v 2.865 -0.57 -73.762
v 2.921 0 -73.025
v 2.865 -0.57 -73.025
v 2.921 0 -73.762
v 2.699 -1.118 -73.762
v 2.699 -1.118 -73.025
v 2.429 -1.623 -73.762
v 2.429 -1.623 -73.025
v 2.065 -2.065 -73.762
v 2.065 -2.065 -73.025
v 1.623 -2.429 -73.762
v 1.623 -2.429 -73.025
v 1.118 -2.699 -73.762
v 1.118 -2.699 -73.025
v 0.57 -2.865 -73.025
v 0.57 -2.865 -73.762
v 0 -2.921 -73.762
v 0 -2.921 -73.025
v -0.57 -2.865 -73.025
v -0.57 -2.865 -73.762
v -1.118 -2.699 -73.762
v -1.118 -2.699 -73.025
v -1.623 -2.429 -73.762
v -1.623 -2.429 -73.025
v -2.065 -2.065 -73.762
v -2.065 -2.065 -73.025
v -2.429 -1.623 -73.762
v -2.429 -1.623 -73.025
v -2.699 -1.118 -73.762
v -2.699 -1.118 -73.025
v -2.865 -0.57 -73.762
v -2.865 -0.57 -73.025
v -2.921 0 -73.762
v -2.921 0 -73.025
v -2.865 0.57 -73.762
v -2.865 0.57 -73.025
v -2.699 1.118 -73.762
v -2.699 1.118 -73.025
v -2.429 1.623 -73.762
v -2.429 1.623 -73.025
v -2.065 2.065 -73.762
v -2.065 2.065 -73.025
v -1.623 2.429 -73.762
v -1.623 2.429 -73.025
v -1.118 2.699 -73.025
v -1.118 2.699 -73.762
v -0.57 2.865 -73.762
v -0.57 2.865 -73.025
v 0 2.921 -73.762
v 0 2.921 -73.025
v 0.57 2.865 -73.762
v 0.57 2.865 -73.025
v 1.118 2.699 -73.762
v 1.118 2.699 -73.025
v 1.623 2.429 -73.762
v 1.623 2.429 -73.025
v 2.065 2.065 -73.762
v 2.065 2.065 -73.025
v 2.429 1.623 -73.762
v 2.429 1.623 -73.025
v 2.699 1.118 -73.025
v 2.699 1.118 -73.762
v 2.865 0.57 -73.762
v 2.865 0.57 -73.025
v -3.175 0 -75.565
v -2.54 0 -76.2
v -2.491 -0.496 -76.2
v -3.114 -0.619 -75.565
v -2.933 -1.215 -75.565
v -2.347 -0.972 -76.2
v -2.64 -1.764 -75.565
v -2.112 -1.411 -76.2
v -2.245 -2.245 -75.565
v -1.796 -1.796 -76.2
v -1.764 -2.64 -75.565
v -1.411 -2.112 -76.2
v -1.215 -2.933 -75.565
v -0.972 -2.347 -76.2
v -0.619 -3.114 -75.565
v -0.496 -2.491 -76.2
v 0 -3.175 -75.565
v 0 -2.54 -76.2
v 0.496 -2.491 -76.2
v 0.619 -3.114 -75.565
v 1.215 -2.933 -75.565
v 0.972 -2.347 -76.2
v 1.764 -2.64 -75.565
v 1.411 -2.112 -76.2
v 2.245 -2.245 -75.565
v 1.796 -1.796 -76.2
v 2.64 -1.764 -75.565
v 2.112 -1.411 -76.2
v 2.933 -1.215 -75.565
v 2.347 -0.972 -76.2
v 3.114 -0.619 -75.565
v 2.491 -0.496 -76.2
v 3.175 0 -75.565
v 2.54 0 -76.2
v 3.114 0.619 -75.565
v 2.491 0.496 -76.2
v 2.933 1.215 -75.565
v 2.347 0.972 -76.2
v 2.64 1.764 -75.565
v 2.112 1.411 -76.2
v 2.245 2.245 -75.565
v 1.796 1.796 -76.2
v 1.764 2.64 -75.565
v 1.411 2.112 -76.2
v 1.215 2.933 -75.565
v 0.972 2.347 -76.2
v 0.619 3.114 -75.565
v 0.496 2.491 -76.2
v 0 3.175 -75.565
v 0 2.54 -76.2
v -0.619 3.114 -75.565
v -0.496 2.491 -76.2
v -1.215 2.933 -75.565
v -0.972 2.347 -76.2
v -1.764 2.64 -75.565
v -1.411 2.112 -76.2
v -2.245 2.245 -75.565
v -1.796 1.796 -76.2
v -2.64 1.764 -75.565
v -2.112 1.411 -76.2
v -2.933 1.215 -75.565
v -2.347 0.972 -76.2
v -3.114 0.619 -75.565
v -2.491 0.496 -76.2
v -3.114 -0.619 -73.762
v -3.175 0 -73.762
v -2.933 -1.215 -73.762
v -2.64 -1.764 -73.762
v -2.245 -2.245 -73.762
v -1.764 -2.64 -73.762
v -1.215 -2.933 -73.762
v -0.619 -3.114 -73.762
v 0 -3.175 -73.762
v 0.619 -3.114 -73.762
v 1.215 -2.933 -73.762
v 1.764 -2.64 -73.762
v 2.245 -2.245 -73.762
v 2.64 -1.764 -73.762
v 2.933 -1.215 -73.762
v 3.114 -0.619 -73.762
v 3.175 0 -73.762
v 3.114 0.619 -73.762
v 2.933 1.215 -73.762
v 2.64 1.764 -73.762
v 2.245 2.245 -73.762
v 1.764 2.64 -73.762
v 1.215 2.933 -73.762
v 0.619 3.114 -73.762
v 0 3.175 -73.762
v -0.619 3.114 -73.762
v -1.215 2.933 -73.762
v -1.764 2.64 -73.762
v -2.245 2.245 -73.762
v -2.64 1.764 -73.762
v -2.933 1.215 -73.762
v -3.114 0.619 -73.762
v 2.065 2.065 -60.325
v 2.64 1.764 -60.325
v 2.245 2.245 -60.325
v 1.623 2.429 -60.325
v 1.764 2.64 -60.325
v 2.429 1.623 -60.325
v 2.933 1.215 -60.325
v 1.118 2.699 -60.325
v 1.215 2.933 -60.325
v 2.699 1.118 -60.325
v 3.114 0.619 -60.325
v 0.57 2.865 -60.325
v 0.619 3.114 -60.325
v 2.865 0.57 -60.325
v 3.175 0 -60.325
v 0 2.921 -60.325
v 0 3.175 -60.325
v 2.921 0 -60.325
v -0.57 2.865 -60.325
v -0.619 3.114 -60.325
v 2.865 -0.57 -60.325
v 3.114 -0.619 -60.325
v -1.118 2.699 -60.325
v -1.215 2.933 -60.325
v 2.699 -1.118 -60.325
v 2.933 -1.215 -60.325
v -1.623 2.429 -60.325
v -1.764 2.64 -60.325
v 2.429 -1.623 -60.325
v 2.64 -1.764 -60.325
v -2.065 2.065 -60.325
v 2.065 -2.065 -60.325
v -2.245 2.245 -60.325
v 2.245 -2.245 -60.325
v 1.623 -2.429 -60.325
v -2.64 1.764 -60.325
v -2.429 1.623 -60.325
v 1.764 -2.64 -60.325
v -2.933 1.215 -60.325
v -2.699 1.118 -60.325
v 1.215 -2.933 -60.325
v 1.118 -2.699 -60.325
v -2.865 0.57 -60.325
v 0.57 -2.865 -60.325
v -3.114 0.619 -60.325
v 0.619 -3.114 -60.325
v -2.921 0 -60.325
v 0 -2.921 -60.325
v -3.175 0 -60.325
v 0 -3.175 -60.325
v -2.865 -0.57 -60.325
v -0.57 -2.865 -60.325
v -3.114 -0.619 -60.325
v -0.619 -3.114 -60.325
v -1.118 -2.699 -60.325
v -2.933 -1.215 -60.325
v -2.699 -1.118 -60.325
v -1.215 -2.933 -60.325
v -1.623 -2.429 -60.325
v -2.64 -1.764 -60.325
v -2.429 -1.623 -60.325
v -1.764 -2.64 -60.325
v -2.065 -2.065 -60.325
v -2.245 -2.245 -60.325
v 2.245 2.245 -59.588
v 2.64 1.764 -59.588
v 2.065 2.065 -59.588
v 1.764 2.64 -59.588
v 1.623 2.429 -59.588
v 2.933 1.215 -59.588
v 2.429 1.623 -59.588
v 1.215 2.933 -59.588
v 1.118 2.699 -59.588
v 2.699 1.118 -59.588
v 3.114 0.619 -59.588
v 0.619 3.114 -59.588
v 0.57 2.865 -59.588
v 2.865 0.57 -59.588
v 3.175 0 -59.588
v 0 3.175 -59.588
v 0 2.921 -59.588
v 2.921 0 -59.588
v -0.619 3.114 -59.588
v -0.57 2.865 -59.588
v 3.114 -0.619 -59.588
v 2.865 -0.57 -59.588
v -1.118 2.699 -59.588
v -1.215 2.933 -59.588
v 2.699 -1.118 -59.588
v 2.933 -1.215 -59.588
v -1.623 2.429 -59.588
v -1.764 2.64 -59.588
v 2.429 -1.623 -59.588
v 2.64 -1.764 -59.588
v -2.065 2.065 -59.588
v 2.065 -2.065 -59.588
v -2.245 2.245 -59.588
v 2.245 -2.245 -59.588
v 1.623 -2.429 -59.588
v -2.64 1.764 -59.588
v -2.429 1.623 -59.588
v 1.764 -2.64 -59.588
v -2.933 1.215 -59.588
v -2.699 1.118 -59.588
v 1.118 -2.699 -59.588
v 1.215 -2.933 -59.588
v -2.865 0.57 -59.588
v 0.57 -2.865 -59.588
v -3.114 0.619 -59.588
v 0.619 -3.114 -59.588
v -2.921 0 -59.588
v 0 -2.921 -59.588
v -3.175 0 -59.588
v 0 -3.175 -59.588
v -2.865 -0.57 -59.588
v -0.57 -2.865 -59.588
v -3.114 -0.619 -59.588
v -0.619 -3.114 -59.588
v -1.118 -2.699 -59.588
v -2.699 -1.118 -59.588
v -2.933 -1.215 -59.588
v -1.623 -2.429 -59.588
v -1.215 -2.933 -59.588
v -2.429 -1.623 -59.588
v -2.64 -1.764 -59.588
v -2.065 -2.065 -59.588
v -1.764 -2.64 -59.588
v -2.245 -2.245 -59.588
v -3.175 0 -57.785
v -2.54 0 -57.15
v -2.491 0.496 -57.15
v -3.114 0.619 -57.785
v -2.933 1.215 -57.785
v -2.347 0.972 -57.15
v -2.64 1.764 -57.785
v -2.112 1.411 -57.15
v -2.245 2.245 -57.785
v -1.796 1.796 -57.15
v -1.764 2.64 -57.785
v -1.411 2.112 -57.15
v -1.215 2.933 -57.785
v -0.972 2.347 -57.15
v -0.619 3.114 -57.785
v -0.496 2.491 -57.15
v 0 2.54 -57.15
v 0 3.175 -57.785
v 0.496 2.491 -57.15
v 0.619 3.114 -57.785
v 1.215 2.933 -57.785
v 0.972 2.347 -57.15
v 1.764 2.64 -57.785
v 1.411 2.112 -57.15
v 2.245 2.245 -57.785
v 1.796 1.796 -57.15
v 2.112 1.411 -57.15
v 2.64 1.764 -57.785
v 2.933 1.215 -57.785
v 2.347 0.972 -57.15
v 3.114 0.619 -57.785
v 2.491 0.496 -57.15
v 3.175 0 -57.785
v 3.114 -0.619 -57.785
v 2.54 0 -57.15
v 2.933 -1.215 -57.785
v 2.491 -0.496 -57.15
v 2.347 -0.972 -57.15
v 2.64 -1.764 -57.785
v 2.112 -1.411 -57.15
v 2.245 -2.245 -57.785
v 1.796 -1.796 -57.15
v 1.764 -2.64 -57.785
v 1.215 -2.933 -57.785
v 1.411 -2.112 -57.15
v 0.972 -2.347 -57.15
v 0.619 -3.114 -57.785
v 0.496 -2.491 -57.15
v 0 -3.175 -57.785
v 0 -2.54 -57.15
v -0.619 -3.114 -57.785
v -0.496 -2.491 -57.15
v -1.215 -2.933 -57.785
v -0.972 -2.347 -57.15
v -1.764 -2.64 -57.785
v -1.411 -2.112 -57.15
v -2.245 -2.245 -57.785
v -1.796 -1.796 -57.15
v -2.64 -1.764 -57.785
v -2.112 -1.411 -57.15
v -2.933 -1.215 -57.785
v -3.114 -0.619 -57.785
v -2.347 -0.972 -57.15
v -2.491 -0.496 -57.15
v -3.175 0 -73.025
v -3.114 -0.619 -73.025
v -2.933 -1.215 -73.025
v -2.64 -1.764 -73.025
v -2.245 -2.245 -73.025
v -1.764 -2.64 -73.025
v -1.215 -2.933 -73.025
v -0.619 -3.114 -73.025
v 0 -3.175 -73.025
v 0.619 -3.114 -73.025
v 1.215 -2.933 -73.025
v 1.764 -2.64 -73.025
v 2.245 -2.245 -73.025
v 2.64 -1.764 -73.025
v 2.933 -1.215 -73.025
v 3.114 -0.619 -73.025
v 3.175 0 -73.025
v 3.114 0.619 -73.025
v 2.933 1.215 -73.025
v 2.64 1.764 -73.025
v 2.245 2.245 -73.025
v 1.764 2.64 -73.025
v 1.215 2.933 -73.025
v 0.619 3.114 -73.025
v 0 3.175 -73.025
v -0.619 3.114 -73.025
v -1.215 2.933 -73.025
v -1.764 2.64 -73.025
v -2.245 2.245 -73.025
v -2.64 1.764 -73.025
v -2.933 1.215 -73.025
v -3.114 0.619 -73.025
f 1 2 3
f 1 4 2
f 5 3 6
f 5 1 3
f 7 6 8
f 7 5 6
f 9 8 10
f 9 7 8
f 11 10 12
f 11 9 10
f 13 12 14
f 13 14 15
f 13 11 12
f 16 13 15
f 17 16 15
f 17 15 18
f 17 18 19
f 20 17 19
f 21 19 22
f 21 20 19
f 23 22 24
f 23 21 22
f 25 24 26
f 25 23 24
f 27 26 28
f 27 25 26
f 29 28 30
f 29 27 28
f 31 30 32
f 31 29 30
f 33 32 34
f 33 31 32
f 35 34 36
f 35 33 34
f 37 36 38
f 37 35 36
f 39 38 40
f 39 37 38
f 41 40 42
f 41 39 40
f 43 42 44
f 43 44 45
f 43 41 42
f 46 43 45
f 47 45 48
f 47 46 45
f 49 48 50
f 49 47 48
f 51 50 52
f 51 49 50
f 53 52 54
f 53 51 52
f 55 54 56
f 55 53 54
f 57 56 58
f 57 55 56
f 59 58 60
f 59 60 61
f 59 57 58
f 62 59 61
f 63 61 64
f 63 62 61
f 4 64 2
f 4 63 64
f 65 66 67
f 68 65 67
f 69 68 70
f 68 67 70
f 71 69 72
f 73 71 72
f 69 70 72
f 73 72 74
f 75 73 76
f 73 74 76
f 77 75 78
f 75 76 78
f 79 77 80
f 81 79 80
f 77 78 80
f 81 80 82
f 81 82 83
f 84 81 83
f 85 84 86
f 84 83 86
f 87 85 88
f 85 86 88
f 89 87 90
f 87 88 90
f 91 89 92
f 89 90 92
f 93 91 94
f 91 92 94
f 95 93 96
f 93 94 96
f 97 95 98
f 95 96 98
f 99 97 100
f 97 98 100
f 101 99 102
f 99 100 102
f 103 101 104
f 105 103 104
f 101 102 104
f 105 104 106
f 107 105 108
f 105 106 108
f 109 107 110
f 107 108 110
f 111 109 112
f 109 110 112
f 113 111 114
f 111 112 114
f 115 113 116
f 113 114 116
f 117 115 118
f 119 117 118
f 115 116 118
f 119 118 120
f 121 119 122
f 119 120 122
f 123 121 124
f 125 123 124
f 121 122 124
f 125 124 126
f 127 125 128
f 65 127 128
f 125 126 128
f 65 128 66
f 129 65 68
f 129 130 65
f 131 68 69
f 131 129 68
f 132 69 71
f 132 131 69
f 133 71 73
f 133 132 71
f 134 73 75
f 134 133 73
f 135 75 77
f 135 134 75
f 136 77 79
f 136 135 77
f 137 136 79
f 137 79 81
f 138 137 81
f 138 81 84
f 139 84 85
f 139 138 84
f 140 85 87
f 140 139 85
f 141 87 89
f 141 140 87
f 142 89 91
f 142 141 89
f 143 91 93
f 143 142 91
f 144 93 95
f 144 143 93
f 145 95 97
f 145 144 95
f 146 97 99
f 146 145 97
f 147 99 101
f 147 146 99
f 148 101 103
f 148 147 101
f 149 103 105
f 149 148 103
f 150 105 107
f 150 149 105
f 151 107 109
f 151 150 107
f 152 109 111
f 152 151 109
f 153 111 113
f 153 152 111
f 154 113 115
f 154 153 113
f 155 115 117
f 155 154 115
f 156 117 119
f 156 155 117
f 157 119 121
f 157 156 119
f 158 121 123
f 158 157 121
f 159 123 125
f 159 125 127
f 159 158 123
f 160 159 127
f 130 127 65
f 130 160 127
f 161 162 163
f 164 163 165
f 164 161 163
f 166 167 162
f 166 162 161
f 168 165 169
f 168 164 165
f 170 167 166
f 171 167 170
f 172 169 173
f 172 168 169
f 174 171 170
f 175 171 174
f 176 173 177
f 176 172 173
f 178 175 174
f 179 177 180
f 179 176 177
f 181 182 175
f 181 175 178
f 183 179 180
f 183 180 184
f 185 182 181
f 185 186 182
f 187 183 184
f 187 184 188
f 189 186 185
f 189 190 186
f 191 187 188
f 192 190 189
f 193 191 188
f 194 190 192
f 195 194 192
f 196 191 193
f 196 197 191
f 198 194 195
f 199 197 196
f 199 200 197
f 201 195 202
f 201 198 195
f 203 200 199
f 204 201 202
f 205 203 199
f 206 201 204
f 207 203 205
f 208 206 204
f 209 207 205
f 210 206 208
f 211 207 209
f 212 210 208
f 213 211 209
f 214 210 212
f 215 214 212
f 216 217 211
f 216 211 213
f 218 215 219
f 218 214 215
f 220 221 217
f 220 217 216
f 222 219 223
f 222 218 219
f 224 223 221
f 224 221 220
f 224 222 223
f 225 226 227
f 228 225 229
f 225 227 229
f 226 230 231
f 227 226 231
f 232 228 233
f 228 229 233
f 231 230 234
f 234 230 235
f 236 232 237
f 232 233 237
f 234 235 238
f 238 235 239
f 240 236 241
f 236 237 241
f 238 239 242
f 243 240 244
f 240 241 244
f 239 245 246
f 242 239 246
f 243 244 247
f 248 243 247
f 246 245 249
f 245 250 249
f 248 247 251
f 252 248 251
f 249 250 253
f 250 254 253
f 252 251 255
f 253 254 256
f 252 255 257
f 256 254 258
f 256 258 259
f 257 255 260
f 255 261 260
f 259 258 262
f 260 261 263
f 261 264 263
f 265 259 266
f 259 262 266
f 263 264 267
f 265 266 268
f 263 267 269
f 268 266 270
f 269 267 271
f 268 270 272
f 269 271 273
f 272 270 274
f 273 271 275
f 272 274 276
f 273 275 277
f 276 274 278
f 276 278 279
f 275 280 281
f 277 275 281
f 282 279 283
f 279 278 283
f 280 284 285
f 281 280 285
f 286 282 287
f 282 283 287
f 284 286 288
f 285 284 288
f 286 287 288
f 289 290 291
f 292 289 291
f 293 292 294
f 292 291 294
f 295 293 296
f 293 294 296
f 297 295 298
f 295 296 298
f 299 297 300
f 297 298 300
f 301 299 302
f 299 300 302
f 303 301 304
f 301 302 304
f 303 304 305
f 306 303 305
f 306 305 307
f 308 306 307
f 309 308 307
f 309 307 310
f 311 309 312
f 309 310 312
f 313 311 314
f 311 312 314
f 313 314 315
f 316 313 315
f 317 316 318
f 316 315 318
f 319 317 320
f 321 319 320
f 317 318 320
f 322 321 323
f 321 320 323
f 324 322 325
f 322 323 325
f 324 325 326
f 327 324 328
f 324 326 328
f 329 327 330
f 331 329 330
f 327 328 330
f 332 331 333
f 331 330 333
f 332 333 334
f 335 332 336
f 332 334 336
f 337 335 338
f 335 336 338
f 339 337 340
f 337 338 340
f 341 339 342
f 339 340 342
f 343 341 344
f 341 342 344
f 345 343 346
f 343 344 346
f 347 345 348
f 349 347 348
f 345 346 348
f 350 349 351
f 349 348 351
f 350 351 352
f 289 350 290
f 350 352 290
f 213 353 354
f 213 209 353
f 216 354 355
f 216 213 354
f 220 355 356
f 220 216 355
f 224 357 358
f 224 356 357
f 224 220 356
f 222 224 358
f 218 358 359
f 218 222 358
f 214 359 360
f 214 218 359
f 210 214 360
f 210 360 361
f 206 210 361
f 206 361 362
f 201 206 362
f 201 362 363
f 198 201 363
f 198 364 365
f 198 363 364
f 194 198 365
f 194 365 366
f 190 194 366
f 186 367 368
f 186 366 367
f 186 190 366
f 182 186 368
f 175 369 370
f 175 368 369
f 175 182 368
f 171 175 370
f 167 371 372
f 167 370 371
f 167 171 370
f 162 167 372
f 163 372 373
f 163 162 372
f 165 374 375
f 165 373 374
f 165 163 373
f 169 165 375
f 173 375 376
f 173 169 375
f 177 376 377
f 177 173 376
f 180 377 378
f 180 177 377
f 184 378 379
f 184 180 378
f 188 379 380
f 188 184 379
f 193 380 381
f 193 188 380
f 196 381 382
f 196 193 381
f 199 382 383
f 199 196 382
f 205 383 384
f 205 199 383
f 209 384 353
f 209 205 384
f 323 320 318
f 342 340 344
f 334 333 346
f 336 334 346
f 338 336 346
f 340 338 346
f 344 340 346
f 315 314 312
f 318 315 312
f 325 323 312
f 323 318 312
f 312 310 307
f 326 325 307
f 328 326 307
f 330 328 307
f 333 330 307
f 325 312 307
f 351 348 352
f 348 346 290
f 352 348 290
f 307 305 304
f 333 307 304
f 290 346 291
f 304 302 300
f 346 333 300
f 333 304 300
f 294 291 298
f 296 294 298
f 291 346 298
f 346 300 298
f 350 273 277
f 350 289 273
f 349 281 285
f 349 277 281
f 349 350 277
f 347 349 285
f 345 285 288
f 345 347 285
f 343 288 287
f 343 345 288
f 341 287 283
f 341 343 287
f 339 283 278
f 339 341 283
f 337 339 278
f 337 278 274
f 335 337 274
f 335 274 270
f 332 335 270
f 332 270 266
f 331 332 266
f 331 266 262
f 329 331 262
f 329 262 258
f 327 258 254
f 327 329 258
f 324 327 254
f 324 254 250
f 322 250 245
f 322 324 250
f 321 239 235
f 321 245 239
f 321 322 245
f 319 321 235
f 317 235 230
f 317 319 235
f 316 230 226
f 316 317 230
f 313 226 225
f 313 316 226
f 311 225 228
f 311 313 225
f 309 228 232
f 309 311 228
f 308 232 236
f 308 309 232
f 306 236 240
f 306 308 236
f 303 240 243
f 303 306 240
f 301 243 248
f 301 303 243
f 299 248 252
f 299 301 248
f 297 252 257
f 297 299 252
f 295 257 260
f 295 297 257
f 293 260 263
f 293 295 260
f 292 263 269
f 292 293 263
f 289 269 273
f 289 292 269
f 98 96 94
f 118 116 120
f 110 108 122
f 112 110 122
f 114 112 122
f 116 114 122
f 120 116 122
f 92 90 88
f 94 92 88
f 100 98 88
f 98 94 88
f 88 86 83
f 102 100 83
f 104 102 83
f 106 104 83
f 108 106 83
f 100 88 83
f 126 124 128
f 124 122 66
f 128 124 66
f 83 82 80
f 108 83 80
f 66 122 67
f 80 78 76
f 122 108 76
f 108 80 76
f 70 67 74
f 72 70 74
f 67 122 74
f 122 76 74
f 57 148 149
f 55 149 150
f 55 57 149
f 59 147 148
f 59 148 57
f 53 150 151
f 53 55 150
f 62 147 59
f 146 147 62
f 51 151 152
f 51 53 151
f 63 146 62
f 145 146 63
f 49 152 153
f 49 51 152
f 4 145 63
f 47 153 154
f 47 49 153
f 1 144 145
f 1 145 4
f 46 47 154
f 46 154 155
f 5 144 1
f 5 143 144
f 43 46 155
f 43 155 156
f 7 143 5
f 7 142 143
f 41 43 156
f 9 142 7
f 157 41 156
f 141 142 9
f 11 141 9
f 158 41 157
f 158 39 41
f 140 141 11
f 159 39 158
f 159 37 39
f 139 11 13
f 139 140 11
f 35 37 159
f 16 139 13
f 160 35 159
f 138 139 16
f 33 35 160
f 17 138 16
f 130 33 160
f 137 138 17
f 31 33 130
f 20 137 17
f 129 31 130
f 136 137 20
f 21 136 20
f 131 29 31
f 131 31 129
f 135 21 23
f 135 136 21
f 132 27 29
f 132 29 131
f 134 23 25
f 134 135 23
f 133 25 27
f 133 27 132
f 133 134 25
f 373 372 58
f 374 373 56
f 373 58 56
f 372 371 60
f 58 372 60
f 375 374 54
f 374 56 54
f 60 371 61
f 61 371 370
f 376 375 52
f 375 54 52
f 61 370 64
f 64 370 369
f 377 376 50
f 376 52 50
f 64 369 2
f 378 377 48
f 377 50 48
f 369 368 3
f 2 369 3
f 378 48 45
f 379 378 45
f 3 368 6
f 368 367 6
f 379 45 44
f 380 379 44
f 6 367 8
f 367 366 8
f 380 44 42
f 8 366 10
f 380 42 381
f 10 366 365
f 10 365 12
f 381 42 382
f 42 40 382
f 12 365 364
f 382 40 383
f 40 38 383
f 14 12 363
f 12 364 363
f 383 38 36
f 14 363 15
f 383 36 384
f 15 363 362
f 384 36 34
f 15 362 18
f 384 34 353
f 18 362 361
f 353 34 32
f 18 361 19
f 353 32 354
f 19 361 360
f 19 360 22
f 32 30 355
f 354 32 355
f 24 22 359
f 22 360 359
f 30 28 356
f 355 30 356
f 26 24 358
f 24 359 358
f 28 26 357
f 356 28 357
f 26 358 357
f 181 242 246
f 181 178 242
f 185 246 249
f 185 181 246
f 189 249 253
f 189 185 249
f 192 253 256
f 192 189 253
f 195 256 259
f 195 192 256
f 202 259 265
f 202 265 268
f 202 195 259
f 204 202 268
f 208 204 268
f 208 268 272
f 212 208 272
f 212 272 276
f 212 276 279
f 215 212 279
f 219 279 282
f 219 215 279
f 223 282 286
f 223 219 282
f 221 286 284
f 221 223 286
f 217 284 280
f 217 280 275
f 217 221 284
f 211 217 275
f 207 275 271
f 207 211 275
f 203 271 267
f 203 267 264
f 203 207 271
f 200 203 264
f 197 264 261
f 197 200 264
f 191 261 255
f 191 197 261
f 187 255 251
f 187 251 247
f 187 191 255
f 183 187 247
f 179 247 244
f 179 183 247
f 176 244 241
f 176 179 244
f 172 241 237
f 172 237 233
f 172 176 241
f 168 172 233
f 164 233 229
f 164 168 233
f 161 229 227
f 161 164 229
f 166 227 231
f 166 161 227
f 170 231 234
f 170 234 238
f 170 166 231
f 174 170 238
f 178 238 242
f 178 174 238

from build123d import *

# Parameters (mm, degrees)
SKETCH3_R           = 3.175
BOSS_EXTRUDE1_DEPTH = 76.2
CHAMFER1_SIZE       = 0.635
CUT_TO_LENGTH_START = -19.05
SKETCH4_R           = 3.175
CUT_TO_LENGTH_DEPTH = 134.416131485
CHAMER_CUT_END_SIZE = 0.635
SKETCH5_W           = 0.254
SKETCH5_H           = 0.7366


with BuildPart() as part:
    # Sketch3 → Boss-Extrude1 (new, symmetric)
    with BuildSketch(Plane.XY):
        with Locations(Location((0, 0, 0), (0, 0, 180))):
            Circle(SKETCH3_R)
    extrude(amount=BOSS_EXTRUDE1_DEPTH, both=True)

    # Chamfer1
    chamfer1_edges = [part.edges().sort_by_distance(p)[0] for p in [
        (3.175, 0, -76.2),
        (3.175, 0, 76.2),
    ]]
    chamfer(chamfer1_edges, length=CHAMFER1_SIZE)

    # Sketch4 → CUT-TO-LENGTH (cut, through all)
    with BuildSketch(Plane(origin=(0, 0, -76.2), x_dir=(-1, 0, 0), z_dir=(0, 0, -1)).offset(CUT_TO_LENGTH_START)):
        Circle(SKETCH4_R)
    extrude(amount=-CUT_TO_LENGTH_DEPTH, mode=Mode.SUBTRACT)

    # CHAMER-CUT-END
    chamer_cut_end_edges = [part.edges().sort_by_distance(p)[0] for p in [
        (3.175, 0, -57.15),
    ]]
    chamfer(chamer_cut_end_edges, length=CHAMER_CUT_END_SIZE)

    # Sketch5 → SNAP-RING-CUT (revolve, cut)
    with BuildSketch(Plane(origin=(0, 0, 0), x_dir=(1, 0, 0), z_dir=(0, 1, 0))):
        with Locations((3.048, 59.9567)):
            Rectangle(SKETCH5_W, SKETCH5_H)
        with Locations((3.048, 73.3933)):
            Rectangle(SKETCH5_W, SKETCH5_H)
    revolve(axis=Axis((0, 0, -57.785), (0, 0, -1)), mode=Mode.SUBTRACT)


solid = part.part
